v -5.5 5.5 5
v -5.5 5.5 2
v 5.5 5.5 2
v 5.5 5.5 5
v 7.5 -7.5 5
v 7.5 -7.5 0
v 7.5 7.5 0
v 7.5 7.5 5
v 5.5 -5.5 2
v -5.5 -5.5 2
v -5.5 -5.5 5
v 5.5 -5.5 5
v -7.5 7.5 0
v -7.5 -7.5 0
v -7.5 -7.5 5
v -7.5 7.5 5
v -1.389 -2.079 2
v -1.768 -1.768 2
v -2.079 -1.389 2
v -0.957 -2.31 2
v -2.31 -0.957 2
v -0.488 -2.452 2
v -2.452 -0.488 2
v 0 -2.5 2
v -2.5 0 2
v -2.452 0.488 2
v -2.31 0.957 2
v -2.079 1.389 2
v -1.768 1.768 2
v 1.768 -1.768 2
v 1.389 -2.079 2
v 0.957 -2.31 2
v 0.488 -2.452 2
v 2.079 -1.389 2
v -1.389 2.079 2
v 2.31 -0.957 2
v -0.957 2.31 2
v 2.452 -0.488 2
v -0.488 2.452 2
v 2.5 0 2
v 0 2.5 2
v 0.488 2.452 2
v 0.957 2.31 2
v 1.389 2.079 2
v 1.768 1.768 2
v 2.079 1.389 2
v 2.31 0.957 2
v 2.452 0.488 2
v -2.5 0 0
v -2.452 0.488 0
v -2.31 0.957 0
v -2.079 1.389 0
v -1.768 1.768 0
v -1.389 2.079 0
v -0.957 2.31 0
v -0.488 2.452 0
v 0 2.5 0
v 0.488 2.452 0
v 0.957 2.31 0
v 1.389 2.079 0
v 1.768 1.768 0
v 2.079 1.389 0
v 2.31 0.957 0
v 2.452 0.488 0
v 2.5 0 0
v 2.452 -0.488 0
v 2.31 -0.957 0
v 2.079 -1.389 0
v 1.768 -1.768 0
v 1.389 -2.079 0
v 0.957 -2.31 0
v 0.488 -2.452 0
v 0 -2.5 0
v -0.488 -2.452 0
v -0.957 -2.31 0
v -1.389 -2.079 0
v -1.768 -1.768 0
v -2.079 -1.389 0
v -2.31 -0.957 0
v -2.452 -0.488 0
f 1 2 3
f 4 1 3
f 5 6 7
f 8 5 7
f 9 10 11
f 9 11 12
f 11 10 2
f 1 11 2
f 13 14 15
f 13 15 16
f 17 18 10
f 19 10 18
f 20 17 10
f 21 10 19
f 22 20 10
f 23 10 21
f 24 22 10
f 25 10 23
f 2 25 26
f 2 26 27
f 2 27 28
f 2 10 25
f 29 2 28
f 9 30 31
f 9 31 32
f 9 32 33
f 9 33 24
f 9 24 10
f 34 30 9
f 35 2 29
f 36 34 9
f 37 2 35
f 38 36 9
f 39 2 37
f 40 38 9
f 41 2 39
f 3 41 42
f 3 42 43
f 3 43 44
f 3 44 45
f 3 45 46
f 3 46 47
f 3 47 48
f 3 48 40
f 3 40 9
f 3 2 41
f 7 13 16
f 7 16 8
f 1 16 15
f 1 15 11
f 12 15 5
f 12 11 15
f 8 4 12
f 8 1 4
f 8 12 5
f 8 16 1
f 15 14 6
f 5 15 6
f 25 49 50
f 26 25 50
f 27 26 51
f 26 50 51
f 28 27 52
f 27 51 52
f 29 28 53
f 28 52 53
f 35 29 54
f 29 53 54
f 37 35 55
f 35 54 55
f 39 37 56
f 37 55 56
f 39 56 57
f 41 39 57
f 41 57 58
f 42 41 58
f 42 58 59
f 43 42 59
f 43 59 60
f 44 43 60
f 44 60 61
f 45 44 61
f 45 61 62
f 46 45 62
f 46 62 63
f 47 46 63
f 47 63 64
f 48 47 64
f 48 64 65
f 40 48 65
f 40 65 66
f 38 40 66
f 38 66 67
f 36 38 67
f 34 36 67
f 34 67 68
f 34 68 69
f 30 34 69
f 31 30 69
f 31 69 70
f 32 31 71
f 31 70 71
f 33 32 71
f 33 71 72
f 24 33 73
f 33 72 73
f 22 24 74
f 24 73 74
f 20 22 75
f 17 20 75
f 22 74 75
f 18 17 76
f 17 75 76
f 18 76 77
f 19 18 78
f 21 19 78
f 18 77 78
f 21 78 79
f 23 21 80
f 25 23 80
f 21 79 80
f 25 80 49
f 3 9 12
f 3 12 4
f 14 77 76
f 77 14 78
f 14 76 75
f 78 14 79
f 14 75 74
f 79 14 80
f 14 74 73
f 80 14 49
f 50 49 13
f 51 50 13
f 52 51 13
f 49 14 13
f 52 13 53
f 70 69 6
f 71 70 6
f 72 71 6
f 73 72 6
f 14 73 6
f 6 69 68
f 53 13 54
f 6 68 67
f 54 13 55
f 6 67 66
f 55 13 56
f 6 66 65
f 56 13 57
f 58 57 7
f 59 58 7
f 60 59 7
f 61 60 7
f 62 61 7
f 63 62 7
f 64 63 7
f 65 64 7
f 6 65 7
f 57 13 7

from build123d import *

# Parameters (mm, degrees)
SKETCH_1_W          = 15
SKETCH_1_H          = 15
EXTRUDE_2_DEPTH     = 5
SHELL_1_T           = -2
SKETCH_2_R          = 2.5
CUT_EXTRUDE_1_DEPTH = 5


with BuildPart() as part:
    # 草图1 → 凸台-拉伸2 (new body)
    with BuildSketch(Plane.XY):
        Rectangle(SKETCH_1_W, SKETCH_1_H)
    extrude(amount=EXTRUDE_2_DEPTH)

    # 抽壳1
    shell_1_openings = [part.faces().sort_by_distance(p)[0] for p in [
        (0, 0, 5),
    ]]
    offset(amount=SHELL_1_T, openings=shell_1_openings, kind=Kind.INTERSECTION)

    # 草图2 → 切除-拉伸1 (cut)
    with BuildSketch(Plane(origin=(0, 0, 0), x_dir=(-1, 0, 0), z_dir=(0, 0, -1))):
        Circle(SKETCH_2_R)
    extrude(amount=-CUT_EXTRUDE_1_DEPTH, mode=Mode.SUBTRACT)


solid = part.part
